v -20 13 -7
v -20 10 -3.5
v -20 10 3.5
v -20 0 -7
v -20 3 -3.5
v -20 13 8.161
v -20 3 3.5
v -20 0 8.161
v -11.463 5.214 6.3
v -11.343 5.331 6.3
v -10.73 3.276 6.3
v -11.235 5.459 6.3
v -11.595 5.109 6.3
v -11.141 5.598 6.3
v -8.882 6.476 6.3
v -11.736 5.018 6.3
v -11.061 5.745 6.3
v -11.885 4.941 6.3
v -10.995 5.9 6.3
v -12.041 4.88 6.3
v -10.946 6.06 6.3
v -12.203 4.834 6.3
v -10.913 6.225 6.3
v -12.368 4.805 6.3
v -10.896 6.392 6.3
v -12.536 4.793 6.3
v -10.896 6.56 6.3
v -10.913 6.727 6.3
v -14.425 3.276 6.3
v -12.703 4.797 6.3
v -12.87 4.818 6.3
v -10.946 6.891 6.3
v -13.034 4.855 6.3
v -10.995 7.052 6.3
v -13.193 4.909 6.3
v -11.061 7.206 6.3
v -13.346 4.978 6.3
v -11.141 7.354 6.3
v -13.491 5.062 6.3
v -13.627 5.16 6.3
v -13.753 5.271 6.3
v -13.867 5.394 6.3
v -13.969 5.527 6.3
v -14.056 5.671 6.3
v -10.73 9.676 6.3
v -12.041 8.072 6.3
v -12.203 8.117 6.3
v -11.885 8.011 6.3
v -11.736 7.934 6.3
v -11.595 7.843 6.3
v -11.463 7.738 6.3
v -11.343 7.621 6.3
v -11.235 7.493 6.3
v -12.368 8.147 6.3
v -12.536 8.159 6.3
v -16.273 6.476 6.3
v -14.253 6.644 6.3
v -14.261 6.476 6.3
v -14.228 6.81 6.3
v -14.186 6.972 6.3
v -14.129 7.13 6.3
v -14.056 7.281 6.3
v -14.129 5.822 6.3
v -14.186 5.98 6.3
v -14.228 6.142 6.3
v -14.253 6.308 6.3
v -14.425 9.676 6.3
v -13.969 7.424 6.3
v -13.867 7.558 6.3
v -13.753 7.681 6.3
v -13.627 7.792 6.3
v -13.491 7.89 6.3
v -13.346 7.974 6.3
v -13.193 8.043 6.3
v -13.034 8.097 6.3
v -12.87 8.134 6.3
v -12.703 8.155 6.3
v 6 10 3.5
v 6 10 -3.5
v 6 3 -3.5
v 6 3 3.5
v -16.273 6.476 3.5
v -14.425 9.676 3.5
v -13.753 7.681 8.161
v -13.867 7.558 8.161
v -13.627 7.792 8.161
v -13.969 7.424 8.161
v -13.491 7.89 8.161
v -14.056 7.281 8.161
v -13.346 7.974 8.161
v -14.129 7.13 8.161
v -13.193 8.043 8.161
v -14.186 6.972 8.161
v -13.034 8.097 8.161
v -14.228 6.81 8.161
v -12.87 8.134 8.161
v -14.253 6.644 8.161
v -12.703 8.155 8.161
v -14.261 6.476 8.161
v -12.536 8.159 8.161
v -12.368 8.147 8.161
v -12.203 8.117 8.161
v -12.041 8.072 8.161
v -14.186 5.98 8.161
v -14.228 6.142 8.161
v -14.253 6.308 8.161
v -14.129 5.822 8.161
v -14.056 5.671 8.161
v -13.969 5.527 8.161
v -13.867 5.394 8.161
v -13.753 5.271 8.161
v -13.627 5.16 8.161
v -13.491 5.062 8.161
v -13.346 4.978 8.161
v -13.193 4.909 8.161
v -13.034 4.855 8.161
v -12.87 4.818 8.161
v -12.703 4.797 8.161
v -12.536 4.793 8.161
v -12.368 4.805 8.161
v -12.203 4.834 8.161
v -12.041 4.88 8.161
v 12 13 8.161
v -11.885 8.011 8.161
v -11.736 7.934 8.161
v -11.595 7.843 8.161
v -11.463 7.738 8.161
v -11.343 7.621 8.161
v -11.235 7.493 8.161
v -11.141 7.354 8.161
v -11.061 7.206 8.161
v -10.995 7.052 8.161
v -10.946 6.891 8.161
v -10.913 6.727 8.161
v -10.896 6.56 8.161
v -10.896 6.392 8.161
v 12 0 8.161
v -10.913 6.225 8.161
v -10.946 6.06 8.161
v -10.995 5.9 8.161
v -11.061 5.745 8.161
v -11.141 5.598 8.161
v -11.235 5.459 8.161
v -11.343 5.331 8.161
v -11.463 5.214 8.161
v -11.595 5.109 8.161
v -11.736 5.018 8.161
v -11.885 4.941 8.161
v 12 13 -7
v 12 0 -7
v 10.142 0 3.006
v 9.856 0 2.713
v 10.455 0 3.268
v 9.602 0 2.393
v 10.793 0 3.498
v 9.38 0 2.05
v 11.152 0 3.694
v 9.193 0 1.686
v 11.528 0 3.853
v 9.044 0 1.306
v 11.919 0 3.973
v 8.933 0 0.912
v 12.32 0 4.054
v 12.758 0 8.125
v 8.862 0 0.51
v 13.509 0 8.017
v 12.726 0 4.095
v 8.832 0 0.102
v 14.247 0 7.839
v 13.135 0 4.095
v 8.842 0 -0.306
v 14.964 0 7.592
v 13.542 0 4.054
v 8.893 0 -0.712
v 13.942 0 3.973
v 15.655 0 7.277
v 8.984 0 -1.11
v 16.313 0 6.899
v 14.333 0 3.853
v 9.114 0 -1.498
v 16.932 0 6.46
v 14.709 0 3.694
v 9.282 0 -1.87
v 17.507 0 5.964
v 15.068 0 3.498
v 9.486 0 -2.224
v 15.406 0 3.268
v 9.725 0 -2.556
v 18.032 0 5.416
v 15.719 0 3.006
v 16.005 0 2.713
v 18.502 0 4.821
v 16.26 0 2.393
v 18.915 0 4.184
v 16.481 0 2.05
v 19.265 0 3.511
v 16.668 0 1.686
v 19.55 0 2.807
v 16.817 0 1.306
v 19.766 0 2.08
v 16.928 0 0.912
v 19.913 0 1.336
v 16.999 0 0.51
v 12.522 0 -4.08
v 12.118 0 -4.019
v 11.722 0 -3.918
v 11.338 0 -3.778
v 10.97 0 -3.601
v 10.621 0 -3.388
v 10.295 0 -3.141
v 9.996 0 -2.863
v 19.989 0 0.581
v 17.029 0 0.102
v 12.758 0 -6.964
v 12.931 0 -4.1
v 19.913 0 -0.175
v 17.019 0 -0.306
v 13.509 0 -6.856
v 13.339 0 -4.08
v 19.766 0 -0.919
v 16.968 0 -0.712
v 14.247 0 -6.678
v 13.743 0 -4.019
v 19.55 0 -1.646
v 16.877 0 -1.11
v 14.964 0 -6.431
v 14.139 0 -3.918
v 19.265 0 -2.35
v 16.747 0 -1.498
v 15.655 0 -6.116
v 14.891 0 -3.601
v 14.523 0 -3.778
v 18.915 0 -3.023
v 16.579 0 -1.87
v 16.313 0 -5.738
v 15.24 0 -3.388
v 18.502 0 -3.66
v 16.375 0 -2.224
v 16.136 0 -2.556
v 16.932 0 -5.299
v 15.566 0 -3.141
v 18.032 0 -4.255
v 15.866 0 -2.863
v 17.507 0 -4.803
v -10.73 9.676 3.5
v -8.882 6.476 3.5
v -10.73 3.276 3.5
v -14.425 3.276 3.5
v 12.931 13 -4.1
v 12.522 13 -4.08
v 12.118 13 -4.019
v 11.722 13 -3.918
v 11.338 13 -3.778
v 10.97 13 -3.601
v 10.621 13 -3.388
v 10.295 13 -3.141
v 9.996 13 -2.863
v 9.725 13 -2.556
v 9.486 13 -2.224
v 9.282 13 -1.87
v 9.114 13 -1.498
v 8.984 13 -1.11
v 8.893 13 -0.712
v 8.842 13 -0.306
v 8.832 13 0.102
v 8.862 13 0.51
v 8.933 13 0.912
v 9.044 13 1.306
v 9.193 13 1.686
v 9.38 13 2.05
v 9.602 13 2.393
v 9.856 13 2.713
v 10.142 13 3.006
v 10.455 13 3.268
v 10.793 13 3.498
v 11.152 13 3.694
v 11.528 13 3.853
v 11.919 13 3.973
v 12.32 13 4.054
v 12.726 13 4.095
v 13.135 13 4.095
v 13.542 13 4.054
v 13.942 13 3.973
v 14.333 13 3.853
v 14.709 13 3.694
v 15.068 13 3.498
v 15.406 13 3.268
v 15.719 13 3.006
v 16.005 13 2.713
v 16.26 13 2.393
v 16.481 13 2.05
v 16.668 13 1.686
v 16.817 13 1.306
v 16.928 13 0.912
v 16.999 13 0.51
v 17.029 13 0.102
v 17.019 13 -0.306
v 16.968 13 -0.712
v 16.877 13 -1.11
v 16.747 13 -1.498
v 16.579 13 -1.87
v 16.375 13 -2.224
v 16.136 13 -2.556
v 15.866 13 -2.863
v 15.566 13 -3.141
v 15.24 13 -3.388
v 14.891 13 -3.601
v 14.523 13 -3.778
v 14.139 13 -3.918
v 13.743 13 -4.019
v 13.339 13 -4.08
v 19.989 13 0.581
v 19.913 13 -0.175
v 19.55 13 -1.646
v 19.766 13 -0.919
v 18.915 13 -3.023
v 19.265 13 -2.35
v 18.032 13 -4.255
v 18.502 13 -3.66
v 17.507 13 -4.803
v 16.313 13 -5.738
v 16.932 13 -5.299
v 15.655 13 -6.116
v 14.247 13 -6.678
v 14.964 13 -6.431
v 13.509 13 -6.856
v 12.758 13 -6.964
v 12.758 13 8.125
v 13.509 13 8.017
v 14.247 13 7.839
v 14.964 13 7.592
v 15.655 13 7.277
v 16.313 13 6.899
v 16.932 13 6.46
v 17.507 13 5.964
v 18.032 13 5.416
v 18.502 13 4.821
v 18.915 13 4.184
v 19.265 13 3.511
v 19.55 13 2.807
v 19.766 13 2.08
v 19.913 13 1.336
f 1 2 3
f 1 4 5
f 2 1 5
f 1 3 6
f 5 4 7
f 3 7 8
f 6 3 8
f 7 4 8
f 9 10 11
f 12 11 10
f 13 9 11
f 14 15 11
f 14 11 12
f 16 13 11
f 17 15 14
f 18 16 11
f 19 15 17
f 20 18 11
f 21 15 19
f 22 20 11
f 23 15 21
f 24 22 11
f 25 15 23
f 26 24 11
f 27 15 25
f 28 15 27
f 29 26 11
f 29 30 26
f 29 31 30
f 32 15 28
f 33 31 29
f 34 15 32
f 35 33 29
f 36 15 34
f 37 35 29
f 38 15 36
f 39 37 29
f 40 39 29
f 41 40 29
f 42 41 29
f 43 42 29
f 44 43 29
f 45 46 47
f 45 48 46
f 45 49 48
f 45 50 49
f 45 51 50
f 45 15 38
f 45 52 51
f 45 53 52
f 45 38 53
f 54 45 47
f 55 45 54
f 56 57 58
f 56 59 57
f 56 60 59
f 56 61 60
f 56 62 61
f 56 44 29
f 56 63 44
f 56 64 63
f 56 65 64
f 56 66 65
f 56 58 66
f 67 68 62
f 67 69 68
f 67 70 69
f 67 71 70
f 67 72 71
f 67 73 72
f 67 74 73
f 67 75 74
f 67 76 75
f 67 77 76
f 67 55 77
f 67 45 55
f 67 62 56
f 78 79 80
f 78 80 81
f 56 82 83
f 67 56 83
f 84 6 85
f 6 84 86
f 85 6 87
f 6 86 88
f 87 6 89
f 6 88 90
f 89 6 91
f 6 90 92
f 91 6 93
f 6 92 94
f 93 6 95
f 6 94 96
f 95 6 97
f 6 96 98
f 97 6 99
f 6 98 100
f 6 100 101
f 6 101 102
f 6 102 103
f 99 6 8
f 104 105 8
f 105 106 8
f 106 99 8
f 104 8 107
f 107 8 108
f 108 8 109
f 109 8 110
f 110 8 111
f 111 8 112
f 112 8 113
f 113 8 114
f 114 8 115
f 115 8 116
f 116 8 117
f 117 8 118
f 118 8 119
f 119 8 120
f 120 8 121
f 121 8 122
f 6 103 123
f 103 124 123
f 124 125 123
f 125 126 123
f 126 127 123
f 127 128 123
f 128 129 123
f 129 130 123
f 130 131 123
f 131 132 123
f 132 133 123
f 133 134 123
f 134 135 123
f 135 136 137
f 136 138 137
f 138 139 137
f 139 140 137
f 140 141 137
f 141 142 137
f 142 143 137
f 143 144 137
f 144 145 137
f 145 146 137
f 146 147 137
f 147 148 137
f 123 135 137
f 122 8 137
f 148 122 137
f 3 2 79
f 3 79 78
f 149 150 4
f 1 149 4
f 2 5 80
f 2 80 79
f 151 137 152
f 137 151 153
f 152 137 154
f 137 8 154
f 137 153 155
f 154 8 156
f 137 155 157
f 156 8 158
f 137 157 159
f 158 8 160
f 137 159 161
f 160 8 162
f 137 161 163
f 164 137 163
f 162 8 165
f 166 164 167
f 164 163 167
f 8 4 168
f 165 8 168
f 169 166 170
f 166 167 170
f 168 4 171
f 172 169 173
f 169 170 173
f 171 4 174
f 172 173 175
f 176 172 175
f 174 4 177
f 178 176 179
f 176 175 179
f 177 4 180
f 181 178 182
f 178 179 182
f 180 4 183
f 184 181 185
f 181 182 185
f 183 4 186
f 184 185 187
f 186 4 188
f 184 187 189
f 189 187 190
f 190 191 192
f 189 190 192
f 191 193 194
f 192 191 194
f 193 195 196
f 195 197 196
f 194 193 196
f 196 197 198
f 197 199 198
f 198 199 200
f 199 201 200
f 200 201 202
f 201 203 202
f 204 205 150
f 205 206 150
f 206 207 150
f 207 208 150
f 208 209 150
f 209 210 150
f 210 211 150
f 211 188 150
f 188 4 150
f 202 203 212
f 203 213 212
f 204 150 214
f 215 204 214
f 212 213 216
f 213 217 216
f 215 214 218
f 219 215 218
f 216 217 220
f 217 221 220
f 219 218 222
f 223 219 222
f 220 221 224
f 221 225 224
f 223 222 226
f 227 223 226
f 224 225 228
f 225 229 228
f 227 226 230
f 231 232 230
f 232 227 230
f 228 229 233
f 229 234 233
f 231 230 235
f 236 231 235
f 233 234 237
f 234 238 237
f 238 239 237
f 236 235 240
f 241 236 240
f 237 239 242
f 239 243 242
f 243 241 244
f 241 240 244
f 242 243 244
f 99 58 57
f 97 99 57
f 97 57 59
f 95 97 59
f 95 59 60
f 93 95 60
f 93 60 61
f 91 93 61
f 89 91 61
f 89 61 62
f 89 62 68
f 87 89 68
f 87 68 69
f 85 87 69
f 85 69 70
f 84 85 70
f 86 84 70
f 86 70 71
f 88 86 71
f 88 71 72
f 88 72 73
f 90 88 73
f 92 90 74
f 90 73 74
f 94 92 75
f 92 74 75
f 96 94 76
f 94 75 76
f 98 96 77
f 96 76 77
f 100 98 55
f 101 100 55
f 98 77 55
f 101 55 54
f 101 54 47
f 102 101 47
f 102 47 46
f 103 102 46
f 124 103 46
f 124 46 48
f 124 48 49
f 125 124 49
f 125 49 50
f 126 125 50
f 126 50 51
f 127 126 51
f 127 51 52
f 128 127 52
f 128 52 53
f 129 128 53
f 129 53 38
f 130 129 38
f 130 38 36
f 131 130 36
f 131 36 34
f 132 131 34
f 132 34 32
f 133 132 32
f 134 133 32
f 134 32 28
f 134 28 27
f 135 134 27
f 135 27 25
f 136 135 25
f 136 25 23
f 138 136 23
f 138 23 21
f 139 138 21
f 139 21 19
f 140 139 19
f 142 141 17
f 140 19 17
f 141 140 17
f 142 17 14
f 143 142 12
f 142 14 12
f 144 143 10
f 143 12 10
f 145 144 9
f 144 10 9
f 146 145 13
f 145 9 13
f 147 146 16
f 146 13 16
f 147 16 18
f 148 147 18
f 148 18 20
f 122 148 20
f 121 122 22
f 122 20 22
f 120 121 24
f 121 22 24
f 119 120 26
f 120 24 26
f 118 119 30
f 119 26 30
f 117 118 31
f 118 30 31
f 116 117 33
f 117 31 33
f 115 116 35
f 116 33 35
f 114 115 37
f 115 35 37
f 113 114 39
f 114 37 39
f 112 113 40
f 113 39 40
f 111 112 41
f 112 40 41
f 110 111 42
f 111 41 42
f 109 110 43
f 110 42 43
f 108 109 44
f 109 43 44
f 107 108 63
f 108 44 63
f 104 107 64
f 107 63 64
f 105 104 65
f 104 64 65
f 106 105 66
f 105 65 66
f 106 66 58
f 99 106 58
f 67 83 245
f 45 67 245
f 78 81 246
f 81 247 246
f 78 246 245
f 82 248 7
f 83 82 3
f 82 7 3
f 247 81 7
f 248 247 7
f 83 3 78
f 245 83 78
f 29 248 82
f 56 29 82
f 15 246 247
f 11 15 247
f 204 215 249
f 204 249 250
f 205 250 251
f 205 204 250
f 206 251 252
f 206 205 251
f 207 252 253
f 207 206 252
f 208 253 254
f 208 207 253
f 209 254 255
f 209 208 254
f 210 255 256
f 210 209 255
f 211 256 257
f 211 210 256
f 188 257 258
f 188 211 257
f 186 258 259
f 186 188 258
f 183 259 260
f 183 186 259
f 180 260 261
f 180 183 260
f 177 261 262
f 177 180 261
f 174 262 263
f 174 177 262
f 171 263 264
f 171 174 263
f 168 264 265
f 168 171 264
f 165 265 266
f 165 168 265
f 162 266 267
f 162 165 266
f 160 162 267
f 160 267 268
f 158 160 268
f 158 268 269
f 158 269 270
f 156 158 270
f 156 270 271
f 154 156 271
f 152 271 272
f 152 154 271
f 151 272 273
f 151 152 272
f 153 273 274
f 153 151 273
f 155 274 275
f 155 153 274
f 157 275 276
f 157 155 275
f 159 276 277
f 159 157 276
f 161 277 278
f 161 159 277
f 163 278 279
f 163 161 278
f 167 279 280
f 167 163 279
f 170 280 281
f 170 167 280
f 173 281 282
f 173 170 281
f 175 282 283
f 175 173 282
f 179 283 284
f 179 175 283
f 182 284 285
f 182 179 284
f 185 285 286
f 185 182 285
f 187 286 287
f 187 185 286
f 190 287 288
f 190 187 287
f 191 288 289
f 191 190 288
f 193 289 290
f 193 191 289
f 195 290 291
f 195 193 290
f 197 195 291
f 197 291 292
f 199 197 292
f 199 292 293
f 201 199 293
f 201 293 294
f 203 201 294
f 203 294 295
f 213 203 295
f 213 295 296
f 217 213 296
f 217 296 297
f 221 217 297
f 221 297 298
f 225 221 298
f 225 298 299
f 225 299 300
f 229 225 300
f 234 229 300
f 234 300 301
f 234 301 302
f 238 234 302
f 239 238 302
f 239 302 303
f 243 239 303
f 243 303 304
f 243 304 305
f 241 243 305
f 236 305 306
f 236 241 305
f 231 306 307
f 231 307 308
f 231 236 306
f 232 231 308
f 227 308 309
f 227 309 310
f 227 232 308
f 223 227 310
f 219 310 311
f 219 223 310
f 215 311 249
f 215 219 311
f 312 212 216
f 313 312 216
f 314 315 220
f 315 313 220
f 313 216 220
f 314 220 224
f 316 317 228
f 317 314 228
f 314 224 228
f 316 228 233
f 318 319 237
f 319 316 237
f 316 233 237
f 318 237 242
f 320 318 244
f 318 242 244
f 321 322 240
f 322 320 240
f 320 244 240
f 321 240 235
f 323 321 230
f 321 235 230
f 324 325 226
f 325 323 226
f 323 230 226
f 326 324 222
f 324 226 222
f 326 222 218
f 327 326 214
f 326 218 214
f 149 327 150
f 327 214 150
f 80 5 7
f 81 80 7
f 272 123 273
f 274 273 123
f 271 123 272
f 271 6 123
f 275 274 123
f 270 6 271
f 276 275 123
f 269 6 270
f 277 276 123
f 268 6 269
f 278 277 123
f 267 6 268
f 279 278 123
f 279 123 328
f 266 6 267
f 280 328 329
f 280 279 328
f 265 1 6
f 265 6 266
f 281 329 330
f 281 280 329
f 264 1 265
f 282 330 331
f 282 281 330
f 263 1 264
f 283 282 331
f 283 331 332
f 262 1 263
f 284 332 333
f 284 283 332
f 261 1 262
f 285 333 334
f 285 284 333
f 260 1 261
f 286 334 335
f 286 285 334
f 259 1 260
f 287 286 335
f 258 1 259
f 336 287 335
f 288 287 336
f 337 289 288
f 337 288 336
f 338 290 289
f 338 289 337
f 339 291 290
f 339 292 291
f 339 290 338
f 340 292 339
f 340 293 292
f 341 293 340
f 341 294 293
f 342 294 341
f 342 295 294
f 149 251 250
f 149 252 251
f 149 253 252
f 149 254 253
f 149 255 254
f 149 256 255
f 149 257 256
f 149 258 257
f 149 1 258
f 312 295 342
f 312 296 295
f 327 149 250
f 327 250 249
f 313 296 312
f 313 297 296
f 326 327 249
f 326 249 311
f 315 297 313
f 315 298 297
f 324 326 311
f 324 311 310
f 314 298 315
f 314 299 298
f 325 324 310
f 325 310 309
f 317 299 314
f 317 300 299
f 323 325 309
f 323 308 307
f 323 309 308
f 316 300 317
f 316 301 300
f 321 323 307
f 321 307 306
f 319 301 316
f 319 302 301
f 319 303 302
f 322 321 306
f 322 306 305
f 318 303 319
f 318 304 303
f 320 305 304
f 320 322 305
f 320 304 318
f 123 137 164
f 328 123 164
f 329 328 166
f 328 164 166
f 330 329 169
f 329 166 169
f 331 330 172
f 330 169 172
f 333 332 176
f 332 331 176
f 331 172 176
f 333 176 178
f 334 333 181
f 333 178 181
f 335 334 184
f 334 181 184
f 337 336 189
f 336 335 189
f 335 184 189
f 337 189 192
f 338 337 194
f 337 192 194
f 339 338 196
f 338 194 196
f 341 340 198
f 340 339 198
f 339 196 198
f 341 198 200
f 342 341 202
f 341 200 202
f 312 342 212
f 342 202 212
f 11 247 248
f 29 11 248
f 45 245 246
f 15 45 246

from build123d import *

# Parameters (mm, degrees)
ESBO_O2_R                = 4.1
RESSALTO_EXTRUS_O1_DEPTH = 13
ESBO_O3_W                = 7
ESBO_O3_H                = 7
CORTE_EXTRUS_O1_DEPTH    = 26
CORTE_EXTRUS_O2_DEPTH    = 2.8
ESBO_O10_R               = 1.683661958
CORTE_EXTRUS_O3_DEPTH    = 2.8
FILETE1_R                = 8


with BuildPart() as part:
    # Esboço2 → Ressalto-extrusão1 (new body)
    with BuildSketch(Plane(origin=(0, 0, 0), x_dir=(1, 0, 0), z_dir=(0, 1, 0))):
        Polygon((20, -5), (20, 7), (-20, 7), (-20, -5), (-20, -8.161034979), (20, -8.161034979), align=None)
        with Locations(Location((12.930574096, 0, 0), (0, 0, 90))):
            Circle(ESBO_O2_R, mode=Mode.SUBTRACT)
    extrude(amount=RESSALTO_EXTRUS_O1_DEPTH)

    # Esboço3 → Corte-extrusão1 (cut)
    with BuildSketch(Plane.ZY.offset(20)):
        with Locations((0, 6.5)):
            Rectangle(ESBO_O3_W, ESBO_O3_H)
    extrude(amount=-CORTE_EXTRUS_O1_DEPTH, mode=Mode.SUBTRACT)

    # Esboço7 → Corte-extrusão2 (cut)
    with BuildSketch(Plane(origin=(0, 0, 3.5), x_dir=(-1, 0, 0), z_dir=(0, 0, -1))):
        Polygon((8.882456985, 6.475905175), (10.729977846, 3.275905175), (14.425019569, 3.275905175), (16.272540431, 6.475905175), (14.425019569, 9.675905175), (10.729977846, 9.675905175), align=None)
    extrude(amount=-CORTE_EXTRUS_O2_DEPTH, mode=Mode.SUBTRACT)

    # Esboço10 → Corte-extrusão3 (cut)
    with BuildSketch(Plane(origin=(0, 0, 6.3), x_dir=(-1, 0, 0), z_dir=(0, 0, -1))):
        with Locations((12.577498708, 6.475905175)):
            Circle(ESBO_O10_R)
    extrude(amount=-CORTE_EXTRUS_O3_DEPTH, mode=Mode.SUBTRACT)

    # Filete1
    # the kernel refuses this fillet: 8 mm, written as the material it takes off along each edge
    with BuildSketch(Plane(origin=(20, -20, -7), x_dir=(0, 0, 1), z_dir=(0, 1, 0))) as filete1_piece_1:
        with BuildLine():
            CenterArc((FILETE1_R, -FILETE1_R), FILETE1_R, 90, 90)
            Line((0, -FILETE1_R), (0, 0))
            Line((0, 0), (FILETE1_R, 0))
        make_face()
    extrude(amount=53, mode=Mode.SUBTRACT)
    with BuildSketch(Plane(origin=(20, -20, 8.161034979), x_dir=(0, 0, -1), z_dir=(0, 1, 0))) as filete1_piece_2:
        with BuildLine():
            CenterArc((FILETE1_R, FILETE1_R), FILETE1_R, 180, 90)
            Line((0, FILETE1_R), (0, 0))
            Line((0, 0), (FILETE1_R, 0))
        make_face()
    extrude(amount=53, mode=Mode.SUBTRACT)


solid = part.part
